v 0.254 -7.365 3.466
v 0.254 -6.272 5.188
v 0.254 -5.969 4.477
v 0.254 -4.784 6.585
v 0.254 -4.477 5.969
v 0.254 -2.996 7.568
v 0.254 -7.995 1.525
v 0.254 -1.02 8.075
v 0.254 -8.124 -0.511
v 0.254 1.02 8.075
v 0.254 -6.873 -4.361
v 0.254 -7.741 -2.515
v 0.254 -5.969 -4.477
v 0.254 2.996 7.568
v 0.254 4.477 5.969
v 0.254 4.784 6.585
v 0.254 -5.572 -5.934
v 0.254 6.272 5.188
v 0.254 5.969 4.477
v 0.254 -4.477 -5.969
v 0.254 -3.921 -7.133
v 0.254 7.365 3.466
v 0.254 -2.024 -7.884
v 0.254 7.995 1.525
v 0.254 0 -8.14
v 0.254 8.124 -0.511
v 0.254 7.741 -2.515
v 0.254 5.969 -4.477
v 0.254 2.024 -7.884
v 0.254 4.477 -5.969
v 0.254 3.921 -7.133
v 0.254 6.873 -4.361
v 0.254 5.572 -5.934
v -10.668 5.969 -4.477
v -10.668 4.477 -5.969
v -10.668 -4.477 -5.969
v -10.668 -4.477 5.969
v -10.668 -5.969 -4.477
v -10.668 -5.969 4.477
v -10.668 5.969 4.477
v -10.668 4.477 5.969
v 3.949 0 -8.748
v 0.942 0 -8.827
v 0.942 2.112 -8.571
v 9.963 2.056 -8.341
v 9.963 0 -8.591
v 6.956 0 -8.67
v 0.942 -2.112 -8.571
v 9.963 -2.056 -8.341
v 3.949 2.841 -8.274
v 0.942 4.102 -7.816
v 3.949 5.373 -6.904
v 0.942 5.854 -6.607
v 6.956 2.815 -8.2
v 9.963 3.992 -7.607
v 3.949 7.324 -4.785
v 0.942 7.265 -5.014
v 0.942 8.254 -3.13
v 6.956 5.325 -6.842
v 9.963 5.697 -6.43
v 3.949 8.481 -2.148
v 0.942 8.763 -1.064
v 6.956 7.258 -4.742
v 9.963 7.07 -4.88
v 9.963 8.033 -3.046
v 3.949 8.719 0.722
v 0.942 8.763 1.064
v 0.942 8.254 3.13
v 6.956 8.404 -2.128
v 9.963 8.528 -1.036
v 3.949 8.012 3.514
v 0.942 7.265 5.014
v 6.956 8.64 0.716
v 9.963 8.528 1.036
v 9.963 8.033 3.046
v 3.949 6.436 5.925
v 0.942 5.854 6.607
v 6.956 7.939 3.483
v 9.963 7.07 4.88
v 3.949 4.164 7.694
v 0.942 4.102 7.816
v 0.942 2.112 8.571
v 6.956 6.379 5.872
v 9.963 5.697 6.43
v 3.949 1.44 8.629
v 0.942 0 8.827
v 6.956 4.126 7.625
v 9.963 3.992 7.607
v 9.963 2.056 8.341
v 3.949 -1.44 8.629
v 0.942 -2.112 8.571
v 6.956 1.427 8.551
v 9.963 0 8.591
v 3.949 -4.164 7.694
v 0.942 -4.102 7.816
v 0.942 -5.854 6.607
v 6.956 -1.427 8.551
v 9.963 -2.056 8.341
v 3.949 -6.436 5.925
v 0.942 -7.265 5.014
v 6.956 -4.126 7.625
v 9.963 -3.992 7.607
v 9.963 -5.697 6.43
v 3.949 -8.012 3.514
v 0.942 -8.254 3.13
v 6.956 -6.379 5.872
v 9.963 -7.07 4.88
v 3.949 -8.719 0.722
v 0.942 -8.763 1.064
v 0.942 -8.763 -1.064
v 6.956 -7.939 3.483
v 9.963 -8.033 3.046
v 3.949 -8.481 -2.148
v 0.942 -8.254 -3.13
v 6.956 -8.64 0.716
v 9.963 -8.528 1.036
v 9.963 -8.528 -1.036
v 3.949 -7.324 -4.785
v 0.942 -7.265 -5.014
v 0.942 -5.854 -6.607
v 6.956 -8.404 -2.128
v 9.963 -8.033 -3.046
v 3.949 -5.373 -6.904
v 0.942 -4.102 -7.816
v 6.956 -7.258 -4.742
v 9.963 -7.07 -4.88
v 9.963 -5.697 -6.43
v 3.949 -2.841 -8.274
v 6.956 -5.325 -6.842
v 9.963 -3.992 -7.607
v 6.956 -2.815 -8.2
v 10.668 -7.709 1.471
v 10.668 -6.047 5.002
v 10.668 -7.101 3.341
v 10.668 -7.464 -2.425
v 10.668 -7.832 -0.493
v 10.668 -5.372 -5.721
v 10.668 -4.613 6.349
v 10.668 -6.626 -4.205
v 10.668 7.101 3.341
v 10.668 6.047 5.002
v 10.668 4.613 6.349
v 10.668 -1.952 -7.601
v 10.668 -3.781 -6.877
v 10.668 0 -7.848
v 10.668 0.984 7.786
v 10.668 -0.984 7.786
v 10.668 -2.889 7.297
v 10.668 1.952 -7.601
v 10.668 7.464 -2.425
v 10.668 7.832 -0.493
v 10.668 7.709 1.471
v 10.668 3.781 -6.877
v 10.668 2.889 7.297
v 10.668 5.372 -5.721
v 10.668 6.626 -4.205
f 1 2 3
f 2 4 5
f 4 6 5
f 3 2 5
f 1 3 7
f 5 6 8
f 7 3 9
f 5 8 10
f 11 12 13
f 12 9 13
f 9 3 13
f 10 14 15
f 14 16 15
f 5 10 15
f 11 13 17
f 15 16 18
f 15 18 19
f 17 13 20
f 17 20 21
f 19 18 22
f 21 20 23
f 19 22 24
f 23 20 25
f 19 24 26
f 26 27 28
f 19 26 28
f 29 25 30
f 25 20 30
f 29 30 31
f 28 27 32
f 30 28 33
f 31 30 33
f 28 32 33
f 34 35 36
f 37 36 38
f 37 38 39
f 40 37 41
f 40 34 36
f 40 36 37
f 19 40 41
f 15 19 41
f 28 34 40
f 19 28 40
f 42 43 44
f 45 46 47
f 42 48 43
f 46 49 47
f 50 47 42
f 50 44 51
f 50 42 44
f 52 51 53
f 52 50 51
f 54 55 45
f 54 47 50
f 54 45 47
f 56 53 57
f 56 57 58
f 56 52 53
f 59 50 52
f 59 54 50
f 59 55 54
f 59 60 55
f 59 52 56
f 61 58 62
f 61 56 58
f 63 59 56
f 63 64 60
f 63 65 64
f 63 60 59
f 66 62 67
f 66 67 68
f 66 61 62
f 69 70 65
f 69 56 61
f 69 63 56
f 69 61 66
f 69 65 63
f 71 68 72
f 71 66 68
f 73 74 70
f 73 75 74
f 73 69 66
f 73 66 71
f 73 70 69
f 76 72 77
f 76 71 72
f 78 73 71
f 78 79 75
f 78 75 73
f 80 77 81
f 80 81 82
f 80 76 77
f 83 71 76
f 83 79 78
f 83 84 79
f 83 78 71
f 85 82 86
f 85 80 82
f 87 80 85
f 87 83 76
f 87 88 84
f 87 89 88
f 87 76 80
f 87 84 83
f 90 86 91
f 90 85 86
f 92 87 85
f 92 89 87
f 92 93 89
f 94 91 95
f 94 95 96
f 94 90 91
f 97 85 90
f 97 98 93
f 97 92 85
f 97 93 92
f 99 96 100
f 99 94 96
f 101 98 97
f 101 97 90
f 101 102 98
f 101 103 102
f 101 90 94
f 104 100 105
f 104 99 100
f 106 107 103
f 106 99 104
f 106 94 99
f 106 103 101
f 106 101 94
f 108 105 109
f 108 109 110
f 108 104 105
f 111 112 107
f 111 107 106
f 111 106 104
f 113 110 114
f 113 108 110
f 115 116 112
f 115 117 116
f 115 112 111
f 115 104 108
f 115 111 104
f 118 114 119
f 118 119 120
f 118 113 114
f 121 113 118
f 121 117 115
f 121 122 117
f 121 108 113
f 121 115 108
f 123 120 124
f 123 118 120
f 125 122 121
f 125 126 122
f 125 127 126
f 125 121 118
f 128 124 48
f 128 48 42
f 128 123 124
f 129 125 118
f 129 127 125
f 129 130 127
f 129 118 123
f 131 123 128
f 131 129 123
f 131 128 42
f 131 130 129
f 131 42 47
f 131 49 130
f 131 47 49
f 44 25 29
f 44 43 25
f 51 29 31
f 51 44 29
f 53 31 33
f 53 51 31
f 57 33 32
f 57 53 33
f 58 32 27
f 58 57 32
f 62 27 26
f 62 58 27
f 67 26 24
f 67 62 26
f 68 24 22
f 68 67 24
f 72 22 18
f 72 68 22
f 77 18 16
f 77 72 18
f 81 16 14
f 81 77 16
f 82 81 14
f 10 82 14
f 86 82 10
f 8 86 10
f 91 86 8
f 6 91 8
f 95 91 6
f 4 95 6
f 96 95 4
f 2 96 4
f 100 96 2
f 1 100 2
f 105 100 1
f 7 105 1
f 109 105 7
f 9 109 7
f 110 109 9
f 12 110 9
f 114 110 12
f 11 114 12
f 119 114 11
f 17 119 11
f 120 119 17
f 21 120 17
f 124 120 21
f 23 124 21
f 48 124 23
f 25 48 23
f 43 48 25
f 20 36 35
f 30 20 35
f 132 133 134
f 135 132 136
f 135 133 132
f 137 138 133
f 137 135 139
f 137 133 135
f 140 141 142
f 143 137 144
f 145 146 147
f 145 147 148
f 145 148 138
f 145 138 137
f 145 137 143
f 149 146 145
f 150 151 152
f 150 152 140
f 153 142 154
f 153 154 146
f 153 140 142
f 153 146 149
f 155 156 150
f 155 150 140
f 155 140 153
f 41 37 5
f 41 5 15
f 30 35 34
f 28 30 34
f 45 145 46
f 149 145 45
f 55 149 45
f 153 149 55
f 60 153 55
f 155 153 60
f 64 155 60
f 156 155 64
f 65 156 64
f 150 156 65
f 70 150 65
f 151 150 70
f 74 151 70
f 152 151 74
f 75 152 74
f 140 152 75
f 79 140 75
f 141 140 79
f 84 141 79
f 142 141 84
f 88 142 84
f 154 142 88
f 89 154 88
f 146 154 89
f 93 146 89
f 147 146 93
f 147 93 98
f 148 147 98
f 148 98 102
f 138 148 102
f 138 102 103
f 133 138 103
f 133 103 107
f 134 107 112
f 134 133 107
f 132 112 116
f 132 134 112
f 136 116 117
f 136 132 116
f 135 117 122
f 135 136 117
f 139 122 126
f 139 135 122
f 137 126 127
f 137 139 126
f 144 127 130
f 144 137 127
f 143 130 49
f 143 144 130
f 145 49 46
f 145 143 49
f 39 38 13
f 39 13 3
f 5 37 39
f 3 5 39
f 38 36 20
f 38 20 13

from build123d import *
from OCP.BRepFilletAPI import BRepFilletAPI_MakeChamfer

# Parameters (mm, degrees)
SKETCH2_R          = 8.5725
EXTRUDE1_DEPTH     = 10.414
EXTRUDE1_DRAFT     = 1.5
CHAMFER1_SIZE      = 0.705555556
CHAMFER1_SIZE2     = 0.724776351
CHAMFER1_SIZE2_2   = 0.687787076
SKETCH6_W          = 11.938
SKETCH6_H          = 11.938
EXTRUDE2_DEPTH     = 10.922
CUT_EXTRUDE1_DEPTH = 10.922


with BuildPart() as part:
    # Sketch2 → Extrude1 (with draft: the straight prism first)
    with BuildSketch(Plane(origin=(10.668, 0, 0), x_dir=(0, 0, -1), z_dir=(1, 0, 0))):
        Circle(SKETCH2_R)
    extrude(amount=-EXTRUDE1_DEPTH)
    # Extrude1: the draft: its side faces are tilted about the plane it starts from
    extrude1_sides = [part.faces().sort_by_distance(p)[0] for p in [
        (5.461, 0, 8.5725),
    ]]
    draft(extrude1_sides, Plane(origin=(10.668, 0, 0), x_dir=(0, 0, -1), z_dir=(1, 0, 0)), EXTRUDE1_DRAFT)

    # Chamfer1: one chamfer whose edges measure the first distance from different faces: ONE call of the kernel's chamfer builder (chamfer() names one face for all edges)
    chamfer1_edges_1 = [part.edges().sort_by_distance(p)[0] for p in [
        (10.668, 0, 8.5725),
    ]]
    chamfer1_side_1 = [part.faces().sort_by_distance(p)[0] for p in [
        (5.461, 0, 8.708850094),
    ]]
    chamfer1_edges_2 = [part.edges().sort_by_distance(p)[0] for p in [
        (0.254, 0, 8.845200187),
    ]]
    chamfer1_side_2 = [part.faces().sort_by_distance(p)[0] for p in [
        (0.254, 0, 0),
    ]]
    chamfer1 = BRepFilletAPI_MakeChamfer(part.part.solid().wrapped)
    for e in chamfer1_edges_1:
        chamfer1.Add(CHAMFER1_SIZE, CHAMFER1_SIZE2, e.wrapped, chamfer1_side_1[0].wrapped)  # the first distance lies on this face
    for e in chamfer1_edges_2:
        chamfer1.Add(CHAMFER1_SIZE, CHAMFER1_SIZE2_2, e.wrapped, chamfer1_side_2[0].wrapped)  # the first distance lies on this face
    add(Compound.cast(chamfer1.Shape()), mode=Mode.REPLACE)

    # Sketch6 → Extrude2 (add)
    with BuildSketch(Plane.ZY.offset(-0.254)):
        Rectangle(SKETCH6_W, SKETCH6_H)
    extrude(amount=EXTRUDE2_DEPTH)

    # Sketch7 → Cut-Extrude1 (cut)
    with BuildSketch(Plane.ZY.offset(10.668)):
        Polygon((4.47675, 5.969), (5.969, 4.47675), (5.969, 5.969), align=None)
        Polygon((5.969, -4.47675), (4.47675, -5.969), (5.969, -5.969), align=None)
        Polygon((-5.969, -4.47675), (-4.47675, -5.969), (-5.969, -5.969), align=None)
        Polygon((-5.969, 4.47675), (-4.47675, 5.969), (-5.969, 5.969), align=None)
    extrude(amount=-CUT_EXTRUDE1_DEPTH, mode=Mode.SUBTRACT)


solid = part.part
